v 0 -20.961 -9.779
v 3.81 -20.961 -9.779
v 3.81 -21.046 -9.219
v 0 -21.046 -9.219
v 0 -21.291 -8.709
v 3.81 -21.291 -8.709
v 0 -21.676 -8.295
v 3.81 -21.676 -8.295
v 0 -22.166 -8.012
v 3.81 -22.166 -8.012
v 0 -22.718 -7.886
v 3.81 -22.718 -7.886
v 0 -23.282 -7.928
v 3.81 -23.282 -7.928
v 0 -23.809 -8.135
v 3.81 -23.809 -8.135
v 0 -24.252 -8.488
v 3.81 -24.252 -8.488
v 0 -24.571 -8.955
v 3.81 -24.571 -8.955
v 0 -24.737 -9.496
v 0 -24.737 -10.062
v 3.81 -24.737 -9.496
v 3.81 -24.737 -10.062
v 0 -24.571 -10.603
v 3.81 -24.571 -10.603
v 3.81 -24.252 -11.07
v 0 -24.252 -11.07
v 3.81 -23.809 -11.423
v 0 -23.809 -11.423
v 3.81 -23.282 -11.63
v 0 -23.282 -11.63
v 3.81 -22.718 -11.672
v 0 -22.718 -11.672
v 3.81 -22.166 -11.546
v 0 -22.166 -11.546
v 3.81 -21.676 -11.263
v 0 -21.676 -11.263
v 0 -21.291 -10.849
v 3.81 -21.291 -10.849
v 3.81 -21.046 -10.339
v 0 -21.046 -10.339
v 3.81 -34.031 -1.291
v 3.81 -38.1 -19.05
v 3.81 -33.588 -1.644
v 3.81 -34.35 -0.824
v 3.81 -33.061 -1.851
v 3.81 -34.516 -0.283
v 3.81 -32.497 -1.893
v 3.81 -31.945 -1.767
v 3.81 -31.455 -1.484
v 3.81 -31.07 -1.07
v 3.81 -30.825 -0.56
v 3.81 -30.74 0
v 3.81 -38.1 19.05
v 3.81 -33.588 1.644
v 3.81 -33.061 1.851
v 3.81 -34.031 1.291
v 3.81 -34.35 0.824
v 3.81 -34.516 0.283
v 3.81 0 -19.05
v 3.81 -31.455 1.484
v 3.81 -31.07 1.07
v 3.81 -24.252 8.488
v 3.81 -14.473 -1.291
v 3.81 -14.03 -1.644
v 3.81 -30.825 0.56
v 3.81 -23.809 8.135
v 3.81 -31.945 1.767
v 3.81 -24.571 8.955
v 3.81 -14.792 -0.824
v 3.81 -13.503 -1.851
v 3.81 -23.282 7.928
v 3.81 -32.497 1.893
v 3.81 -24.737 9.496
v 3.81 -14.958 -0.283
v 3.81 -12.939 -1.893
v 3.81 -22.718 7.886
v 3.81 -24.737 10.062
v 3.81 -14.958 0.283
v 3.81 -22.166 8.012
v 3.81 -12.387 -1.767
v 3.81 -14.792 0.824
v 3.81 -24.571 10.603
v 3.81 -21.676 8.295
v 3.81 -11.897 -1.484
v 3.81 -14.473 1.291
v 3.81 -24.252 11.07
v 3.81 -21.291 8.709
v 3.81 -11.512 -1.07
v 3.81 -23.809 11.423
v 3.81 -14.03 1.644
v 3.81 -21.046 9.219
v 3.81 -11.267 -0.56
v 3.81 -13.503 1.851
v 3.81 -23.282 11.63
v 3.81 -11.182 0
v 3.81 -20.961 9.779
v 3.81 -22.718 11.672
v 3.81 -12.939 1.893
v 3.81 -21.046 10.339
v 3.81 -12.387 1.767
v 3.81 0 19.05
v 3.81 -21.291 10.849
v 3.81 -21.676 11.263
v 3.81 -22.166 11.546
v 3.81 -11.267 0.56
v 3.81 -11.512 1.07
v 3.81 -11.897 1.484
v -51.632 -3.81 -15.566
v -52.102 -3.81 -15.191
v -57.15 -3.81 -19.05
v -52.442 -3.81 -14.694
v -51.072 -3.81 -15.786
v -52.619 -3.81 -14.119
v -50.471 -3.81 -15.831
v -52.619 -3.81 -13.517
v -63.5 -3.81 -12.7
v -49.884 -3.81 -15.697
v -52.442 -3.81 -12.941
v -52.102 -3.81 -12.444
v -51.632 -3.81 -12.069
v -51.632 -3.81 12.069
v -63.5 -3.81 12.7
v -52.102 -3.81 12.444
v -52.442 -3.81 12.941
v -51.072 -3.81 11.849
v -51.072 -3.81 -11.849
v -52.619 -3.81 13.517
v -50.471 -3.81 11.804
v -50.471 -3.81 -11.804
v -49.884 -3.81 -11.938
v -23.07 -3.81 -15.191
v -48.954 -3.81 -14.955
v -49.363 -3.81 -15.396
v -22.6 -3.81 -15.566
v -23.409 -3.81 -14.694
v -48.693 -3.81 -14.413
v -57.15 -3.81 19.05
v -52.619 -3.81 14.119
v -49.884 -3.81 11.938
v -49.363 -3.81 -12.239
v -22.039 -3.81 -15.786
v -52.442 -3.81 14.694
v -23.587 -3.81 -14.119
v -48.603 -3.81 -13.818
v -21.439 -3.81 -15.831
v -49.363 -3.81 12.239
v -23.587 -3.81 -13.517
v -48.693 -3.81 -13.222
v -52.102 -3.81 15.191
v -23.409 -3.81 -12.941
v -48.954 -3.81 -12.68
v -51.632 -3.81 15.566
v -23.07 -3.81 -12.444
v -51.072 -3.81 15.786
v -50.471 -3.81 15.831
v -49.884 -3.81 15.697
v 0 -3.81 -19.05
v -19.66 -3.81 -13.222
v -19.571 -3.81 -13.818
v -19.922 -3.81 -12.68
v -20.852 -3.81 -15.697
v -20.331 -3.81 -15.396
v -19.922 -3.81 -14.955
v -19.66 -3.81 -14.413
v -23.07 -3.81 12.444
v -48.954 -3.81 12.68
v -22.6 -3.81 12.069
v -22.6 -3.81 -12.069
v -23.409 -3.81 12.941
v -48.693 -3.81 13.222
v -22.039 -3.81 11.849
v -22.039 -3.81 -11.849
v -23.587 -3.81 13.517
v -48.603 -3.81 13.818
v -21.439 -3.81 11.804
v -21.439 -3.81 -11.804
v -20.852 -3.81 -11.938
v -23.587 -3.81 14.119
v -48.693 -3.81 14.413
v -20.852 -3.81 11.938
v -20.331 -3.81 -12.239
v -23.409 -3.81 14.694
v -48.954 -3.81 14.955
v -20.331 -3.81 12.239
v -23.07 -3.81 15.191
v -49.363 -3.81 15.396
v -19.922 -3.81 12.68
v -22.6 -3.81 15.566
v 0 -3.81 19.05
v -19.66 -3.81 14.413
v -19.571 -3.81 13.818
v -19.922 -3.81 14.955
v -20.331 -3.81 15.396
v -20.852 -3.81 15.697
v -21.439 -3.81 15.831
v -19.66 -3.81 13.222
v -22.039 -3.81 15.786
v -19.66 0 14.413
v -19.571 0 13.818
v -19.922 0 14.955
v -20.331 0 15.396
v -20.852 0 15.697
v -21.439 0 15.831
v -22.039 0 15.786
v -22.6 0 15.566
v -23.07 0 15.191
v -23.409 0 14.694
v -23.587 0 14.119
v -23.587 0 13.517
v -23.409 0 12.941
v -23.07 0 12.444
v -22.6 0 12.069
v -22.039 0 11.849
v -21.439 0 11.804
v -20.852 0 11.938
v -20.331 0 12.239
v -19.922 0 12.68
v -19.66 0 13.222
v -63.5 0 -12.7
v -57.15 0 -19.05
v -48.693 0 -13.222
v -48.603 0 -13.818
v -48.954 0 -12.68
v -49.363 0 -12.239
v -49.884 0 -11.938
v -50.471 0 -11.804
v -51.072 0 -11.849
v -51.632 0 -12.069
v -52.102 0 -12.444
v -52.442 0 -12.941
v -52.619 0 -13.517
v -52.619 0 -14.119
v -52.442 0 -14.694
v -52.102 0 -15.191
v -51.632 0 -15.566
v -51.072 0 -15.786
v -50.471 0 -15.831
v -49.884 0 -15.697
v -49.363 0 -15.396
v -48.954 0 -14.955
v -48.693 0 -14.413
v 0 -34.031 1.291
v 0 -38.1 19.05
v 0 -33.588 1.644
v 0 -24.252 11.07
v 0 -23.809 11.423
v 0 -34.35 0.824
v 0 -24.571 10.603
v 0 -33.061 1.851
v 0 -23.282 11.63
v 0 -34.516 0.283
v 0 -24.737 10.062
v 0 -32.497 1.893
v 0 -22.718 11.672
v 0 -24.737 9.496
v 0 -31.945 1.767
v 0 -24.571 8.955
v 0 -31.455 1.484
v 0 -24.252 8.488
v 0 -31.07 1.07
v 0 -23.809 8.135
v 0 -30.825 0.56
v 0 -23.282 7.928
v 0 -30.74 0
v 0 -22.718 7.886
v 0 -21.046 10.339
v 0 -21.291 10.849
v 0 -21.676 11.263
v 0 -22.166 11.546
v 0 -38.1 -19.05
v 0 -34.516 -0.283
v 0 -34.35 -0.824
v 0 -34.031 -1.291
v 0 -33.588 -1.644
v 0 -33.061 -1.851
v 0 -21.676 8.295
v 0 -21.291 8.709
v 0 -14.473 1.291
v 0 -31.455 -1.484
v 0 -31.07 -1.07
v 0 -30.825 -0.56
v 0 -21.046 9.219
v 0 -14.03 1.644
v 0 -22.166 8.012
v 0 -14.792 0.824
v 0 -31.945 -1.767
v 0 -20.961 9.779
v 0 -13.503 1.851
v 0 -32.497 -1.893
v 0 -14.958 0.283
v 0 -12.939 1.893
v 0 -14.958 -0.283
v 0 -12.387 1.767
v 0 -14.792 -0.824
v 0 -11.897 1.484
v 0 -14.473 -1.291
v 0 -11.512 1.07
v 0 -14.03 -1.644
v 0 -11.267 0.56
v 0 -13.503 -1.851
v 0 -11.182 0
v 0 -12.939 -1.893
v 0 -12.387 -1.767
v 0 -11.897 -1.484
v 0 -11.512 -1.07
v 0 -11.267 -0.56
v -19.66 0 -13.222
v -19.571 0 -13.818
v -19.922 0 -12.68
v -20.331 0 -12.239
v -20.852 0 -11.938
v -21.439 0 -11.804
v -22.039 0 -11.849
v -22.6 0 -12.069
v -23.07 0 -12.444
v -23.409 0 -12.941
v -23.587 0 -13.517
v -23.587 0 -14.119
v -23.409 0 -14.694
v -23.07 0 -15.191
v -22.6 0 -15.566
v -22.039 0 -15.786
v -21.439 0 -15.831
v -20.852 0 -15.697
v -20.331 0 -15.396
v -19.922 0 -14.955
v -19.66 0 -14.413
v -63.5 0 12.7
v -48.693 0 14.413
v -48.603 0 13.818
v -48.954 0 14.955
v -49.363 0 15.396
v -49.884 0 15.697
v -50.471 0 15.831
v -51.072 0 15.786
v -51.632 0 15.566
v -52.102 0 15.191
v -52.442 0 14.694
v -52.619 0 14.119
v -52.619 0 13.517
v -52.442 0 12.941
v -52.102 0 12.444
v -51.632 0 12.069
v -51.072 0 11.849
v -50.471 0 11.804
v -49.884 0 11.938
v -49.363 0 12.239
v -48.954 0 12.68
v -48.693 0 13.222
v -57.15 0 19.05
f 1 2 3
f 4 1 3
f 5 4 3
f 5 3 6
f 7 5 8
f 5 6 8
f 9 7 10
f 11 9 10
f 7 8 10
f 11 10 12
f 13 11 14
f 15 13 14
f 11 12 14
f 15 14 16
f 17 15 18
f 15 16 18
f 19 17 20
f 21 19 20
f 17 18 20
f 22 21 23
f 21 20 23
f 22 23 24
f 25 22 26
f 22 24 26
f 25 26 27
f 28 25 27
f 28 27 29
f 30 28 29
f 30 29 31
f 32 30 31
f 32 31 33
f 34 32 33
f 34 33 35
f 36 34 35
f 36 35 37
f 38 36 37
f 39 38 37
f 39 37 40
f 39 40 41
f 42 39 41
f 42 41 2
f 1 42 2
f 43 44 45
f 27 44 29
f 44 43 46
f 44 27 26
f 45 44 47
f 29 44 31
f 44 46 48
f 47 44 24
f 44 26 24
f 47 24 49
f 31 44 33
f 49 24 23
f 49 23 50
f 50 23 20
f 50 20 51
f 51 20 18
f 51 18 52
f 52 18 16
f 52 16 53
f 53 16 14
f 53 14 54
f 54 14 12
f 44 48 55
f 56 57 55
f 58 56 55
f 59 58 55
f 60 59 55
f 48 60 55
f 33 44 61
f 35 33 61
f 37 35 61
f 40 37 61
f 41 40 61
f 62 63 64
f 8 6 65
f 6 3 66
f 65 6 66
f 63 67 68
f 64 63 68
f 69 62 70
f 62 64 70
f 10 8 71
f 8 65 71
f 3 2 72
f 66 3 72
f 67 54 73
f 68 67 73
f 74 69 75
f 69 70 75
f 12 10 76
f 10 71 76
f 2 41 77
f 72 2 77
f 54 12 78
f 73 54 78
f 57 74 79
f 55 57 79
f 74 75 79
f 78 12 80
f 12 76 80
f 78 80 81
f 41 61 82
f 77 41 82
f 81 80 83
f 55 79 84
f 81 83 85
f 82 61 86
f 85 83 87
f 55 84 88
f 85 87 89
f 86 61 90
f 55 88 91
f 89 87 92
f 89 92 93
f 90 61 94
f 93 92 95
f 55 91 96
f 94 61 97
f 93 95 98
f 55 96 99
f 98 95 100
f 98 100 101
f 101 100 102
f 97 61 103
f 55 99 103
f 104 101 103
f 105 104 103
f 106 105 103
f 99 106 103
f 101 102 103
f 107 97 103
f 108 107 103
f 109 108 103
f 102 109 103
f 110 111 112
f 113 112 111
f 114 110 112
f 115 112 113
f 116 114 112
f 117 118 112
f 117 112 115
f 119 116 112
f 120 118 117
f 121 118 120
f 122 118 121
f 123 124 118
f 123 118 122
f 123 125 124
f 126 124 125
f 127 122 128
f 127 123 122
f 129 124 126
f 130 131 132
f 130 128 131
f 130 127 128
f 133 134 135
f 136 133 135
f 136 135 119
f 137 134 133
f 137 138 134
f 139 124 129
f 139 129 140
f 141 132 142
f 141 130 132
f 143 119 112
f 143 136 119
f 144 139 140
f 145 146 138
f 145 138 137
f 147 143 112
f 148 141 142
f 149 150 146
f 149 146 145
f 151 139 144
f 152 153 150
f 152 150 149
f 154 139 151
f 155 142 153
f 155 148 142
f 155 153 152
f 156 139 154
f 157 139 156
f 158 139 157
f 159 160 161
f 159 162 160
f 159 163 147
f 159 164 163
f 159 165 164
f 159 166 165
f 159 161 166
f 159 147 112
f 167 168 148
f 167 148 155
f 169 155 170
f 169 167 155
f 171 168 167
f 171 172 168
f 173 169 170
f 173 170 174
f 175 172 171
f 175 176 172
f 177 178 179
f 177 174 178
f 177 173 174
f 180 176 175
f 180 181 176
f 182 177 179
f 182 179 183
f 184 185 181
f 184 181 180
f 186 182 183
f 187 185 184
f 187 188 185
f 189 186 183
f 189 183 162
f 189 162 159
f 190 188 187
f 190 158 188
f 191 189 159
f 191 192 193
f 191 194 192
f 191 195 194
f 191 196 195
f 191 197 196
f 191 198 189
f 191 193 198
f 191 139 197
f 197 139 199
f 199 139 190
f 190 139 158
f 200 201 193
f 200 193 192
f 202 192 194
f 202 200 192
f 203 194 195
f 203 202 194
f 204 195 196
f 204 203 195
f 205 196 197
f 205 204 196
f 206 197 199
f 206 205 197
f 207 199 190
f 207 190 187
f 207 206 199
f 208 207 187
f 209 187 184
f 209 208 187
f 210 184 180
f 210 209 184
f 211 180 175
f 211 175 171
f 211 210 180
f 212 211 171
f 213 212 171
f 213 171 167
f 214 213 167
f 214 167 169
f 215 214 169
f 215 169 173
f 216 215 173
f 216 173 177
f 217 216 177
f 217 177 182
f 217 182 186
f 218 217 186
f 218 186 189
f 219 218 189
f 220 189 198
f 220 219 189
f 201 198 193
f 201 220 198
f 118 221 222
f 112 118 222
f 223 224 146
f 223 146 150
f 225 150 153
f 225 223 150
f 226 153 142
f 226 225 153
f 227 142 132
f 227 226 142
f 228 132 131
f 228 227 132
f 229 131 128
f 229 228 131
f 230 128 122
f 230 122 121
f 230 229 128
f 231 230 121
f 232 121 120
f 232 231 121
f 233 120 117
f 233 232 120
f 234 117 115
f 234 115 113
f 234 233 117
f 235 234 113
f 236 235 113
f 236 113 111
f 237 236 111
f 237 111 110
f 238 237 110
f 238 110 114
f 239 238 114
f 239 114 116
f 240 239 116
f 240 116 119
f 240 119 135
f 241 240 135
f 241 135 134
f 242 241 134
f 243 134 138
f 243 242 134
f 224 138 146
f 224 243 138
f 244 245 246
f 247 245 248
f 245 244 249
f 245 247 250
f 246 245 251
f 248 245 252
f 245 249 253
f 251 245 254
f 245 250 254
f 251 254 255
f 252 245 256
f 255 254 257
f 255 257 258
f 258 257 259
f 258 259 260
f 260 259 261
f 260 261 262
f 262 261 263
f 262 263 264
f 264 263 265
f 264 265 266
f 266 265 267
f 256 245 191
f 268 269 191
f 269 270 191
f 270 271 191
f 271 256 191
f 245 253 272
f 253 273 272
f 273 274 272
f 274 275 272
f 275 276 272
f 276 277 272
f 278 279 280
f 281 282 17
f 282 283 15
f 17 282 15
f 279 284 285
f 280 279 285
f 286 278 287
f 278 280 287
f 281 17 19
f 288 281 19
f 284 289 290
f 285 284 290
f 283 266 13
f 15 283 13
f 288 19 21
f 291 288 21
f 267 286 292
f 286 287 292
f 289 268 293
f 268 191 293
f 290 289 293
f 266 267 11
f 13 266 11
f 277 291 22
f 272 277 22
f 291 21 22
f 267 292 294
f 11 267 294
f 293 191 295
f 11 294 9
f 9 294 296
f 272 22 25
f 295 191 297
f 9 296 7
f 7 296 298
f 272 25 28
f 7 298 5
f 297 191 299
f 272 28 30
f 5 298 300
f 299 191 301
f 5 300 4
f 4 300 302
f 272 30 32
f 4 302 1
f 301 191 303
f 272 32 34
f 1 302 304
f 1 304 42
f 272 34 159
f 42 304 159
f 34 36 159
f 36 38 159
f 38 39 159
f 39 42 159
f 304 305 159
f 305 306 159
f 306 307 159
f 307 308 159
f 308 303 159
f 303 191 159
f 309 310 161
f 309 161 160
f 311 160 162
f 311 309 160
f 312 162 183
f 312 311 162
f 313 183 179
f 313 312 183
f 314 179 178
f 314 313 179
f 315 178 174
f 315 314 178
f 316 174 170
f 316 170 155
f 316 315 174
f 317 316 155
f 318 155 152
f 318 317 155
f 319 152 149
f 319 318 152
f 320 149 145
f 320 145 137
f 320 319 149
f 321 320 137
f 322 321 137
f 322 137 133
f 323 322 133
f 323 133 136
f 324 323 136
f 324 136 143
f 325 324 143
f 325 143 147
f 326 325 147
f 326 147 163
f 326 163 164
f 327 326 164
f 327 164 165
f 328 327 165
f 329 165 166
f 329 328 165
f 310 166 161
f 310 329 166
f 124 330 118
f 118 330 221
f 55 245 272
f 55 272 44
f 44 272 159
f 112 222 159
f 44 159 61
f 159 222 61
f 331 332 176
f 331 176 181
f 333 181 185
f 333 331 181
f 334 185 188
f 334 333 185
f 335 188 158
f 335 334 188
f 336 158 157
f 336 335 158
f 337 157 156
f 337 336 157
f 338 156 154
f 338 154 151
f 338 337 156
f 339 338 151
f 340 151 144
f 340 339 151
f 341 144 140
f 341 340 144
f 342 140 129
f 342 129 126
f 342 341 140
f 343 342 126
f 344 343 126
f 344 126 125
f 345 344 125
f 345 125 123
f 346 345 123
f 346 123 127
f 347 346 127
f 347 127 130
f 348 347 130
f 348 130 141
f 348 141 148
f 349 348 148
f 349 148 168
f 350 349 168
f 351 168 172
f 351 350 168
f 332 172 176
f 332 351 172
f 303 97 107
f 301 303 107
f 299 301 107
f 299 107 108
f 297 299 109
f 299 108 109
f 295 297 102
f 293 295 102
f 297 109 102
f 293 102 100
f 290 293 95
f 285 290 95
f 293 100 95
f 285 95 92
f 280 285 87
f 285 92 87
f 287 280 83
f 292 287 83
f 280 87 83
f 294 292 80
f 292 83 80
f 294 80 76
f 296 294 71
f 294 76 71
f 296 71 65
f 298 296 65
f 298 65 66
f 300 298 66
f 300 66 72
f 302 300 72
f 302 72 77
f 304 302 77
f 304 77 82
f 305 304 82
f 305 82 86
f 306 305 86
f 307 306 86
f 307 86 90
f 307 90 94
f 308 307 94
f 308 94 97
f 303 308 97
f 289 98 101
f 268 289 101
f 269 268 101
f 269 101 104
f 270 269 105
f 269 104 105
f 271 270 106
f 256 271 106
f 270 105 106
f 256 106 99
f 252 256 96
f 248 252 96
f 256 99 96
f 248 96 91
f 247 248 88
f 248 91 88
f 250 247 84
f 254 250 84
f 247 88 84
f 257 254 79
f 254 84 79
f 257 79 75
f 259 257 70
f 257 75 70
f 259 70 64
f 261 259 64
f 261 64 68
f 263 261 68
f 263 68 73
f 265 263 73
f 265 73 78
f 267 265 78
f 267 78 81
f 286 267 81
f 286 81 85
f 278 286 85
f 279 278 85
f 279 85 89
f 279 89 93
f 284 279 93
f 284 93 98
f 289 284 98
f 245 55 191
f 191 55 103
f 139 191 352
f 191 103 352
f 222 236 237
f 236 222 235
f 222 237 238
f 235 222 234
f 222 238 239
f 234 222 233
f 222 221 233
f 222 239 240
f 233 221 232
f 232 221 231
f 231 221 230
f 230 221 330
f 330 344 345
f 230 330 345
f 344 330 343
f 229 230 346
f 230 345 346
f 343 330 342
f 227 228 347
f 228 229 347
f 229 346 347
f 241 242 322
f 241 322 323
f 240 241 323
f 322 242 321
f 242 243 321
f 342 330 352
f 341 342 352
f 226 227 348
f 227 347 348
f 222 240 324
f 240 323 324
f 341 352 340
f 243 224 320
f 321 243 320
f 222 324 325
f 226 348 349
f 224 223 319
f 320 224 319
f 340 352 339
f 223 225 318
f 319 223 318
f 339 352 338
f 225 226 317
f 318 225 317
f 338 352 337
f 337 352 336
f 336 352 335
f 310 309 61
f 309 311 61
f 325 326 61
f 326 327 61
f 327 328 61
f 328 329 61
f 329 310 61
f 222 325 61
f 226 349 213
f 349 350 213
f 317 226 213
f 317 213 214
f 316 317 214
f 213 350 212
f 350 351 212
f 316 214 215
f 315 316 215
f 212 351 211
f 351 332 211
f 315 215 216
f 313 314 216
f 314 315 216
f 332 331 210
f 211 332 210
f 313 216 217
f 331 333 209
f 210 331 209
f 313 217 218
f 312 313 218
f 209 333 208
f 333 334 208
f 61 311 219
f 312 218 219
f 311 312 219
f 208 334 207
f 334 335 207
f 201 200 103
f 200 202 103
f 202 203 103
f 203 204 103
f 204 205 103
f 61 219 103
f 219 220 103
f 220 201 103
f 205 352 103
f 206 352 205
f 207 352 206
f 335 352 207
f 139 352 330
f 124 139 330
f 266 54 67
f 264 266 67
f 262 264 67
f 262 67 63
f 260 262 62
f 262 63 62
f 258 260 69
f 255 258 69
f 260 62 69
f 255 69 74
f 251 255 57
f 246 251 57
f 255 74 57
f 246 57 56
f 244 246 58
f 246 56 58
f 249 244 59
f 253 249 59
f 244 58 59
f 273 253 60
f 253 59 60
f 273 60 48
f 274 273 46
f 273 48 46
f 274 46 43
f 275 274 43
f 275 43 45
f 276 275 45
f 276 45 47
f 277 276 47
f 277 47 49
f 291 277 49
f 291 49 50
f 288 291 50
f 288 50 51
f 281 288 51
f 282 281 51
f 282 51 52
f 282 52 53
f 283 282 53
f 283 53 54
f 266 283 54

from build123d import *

# Parameters (mm, degrees)
F0_R     = 2.0193
F1_DEPTH = 3.81
F2_DEPTH = 38.1
F3_R     = 1.89865
F4_DEPTH = 67.311


with BuildPart() as f1:
    # F0 (on Front) → F1 (new body)
    with BuildSketch(Plane.XZ):
        Polygon((0, 0), (0, 19.05), (-57.15, 19.05), (-63.5, 12.7), (-63.5, 0), (-63.5, -12.7), (-57.15, -19.05), (0, -19.05), align=None)
        with Locations((-50.6222, -13.8176)):
            Circle(F0_R, mode=Mode.SUBTRACT)
        with Locations((-21.59, -13.8176)):
            Circle(F0_R, mode=Mode.SUBTRACT)
        with Locations((-50.6222, 13.8176)):
            Circle(F0_R, mode=Mode.SUBTRACT)
        with Locations((-21.59, 13.8176)):
            Circle(F0_R, mode=Mode.SUBTRACT)
    extrude(amount=F1_DEPTH)

    # F0 (on Front) → F2 (join)
    with BuildSketch(Plane.XZ):
        Polygon((3.81, 19.05), (0, 19.05), (0, 0), (0, -19.05), (3.81, -19.05), (3.81, 0), align=None)
    extrude(amount=F2_DEPTH)

    # F3 (on face) → F4 (cut, through all)
    with BuildSketch(Plane.YZ.offset(3.81)):
        with Locations((-22.86, 9.779)):
            Circle(F3_R)
        with Locations((-22.86, -9.779)):
            Circle(F3_R)
        with Locations((-32.639, 0)):
            Circle(F3_R)
        with Locations((-13.081, 0)):
            Circle(F3_R)
    extrude(amount=-F4_DEPTH, mode=Mode.SUBTRACT)


solid = f1.part
